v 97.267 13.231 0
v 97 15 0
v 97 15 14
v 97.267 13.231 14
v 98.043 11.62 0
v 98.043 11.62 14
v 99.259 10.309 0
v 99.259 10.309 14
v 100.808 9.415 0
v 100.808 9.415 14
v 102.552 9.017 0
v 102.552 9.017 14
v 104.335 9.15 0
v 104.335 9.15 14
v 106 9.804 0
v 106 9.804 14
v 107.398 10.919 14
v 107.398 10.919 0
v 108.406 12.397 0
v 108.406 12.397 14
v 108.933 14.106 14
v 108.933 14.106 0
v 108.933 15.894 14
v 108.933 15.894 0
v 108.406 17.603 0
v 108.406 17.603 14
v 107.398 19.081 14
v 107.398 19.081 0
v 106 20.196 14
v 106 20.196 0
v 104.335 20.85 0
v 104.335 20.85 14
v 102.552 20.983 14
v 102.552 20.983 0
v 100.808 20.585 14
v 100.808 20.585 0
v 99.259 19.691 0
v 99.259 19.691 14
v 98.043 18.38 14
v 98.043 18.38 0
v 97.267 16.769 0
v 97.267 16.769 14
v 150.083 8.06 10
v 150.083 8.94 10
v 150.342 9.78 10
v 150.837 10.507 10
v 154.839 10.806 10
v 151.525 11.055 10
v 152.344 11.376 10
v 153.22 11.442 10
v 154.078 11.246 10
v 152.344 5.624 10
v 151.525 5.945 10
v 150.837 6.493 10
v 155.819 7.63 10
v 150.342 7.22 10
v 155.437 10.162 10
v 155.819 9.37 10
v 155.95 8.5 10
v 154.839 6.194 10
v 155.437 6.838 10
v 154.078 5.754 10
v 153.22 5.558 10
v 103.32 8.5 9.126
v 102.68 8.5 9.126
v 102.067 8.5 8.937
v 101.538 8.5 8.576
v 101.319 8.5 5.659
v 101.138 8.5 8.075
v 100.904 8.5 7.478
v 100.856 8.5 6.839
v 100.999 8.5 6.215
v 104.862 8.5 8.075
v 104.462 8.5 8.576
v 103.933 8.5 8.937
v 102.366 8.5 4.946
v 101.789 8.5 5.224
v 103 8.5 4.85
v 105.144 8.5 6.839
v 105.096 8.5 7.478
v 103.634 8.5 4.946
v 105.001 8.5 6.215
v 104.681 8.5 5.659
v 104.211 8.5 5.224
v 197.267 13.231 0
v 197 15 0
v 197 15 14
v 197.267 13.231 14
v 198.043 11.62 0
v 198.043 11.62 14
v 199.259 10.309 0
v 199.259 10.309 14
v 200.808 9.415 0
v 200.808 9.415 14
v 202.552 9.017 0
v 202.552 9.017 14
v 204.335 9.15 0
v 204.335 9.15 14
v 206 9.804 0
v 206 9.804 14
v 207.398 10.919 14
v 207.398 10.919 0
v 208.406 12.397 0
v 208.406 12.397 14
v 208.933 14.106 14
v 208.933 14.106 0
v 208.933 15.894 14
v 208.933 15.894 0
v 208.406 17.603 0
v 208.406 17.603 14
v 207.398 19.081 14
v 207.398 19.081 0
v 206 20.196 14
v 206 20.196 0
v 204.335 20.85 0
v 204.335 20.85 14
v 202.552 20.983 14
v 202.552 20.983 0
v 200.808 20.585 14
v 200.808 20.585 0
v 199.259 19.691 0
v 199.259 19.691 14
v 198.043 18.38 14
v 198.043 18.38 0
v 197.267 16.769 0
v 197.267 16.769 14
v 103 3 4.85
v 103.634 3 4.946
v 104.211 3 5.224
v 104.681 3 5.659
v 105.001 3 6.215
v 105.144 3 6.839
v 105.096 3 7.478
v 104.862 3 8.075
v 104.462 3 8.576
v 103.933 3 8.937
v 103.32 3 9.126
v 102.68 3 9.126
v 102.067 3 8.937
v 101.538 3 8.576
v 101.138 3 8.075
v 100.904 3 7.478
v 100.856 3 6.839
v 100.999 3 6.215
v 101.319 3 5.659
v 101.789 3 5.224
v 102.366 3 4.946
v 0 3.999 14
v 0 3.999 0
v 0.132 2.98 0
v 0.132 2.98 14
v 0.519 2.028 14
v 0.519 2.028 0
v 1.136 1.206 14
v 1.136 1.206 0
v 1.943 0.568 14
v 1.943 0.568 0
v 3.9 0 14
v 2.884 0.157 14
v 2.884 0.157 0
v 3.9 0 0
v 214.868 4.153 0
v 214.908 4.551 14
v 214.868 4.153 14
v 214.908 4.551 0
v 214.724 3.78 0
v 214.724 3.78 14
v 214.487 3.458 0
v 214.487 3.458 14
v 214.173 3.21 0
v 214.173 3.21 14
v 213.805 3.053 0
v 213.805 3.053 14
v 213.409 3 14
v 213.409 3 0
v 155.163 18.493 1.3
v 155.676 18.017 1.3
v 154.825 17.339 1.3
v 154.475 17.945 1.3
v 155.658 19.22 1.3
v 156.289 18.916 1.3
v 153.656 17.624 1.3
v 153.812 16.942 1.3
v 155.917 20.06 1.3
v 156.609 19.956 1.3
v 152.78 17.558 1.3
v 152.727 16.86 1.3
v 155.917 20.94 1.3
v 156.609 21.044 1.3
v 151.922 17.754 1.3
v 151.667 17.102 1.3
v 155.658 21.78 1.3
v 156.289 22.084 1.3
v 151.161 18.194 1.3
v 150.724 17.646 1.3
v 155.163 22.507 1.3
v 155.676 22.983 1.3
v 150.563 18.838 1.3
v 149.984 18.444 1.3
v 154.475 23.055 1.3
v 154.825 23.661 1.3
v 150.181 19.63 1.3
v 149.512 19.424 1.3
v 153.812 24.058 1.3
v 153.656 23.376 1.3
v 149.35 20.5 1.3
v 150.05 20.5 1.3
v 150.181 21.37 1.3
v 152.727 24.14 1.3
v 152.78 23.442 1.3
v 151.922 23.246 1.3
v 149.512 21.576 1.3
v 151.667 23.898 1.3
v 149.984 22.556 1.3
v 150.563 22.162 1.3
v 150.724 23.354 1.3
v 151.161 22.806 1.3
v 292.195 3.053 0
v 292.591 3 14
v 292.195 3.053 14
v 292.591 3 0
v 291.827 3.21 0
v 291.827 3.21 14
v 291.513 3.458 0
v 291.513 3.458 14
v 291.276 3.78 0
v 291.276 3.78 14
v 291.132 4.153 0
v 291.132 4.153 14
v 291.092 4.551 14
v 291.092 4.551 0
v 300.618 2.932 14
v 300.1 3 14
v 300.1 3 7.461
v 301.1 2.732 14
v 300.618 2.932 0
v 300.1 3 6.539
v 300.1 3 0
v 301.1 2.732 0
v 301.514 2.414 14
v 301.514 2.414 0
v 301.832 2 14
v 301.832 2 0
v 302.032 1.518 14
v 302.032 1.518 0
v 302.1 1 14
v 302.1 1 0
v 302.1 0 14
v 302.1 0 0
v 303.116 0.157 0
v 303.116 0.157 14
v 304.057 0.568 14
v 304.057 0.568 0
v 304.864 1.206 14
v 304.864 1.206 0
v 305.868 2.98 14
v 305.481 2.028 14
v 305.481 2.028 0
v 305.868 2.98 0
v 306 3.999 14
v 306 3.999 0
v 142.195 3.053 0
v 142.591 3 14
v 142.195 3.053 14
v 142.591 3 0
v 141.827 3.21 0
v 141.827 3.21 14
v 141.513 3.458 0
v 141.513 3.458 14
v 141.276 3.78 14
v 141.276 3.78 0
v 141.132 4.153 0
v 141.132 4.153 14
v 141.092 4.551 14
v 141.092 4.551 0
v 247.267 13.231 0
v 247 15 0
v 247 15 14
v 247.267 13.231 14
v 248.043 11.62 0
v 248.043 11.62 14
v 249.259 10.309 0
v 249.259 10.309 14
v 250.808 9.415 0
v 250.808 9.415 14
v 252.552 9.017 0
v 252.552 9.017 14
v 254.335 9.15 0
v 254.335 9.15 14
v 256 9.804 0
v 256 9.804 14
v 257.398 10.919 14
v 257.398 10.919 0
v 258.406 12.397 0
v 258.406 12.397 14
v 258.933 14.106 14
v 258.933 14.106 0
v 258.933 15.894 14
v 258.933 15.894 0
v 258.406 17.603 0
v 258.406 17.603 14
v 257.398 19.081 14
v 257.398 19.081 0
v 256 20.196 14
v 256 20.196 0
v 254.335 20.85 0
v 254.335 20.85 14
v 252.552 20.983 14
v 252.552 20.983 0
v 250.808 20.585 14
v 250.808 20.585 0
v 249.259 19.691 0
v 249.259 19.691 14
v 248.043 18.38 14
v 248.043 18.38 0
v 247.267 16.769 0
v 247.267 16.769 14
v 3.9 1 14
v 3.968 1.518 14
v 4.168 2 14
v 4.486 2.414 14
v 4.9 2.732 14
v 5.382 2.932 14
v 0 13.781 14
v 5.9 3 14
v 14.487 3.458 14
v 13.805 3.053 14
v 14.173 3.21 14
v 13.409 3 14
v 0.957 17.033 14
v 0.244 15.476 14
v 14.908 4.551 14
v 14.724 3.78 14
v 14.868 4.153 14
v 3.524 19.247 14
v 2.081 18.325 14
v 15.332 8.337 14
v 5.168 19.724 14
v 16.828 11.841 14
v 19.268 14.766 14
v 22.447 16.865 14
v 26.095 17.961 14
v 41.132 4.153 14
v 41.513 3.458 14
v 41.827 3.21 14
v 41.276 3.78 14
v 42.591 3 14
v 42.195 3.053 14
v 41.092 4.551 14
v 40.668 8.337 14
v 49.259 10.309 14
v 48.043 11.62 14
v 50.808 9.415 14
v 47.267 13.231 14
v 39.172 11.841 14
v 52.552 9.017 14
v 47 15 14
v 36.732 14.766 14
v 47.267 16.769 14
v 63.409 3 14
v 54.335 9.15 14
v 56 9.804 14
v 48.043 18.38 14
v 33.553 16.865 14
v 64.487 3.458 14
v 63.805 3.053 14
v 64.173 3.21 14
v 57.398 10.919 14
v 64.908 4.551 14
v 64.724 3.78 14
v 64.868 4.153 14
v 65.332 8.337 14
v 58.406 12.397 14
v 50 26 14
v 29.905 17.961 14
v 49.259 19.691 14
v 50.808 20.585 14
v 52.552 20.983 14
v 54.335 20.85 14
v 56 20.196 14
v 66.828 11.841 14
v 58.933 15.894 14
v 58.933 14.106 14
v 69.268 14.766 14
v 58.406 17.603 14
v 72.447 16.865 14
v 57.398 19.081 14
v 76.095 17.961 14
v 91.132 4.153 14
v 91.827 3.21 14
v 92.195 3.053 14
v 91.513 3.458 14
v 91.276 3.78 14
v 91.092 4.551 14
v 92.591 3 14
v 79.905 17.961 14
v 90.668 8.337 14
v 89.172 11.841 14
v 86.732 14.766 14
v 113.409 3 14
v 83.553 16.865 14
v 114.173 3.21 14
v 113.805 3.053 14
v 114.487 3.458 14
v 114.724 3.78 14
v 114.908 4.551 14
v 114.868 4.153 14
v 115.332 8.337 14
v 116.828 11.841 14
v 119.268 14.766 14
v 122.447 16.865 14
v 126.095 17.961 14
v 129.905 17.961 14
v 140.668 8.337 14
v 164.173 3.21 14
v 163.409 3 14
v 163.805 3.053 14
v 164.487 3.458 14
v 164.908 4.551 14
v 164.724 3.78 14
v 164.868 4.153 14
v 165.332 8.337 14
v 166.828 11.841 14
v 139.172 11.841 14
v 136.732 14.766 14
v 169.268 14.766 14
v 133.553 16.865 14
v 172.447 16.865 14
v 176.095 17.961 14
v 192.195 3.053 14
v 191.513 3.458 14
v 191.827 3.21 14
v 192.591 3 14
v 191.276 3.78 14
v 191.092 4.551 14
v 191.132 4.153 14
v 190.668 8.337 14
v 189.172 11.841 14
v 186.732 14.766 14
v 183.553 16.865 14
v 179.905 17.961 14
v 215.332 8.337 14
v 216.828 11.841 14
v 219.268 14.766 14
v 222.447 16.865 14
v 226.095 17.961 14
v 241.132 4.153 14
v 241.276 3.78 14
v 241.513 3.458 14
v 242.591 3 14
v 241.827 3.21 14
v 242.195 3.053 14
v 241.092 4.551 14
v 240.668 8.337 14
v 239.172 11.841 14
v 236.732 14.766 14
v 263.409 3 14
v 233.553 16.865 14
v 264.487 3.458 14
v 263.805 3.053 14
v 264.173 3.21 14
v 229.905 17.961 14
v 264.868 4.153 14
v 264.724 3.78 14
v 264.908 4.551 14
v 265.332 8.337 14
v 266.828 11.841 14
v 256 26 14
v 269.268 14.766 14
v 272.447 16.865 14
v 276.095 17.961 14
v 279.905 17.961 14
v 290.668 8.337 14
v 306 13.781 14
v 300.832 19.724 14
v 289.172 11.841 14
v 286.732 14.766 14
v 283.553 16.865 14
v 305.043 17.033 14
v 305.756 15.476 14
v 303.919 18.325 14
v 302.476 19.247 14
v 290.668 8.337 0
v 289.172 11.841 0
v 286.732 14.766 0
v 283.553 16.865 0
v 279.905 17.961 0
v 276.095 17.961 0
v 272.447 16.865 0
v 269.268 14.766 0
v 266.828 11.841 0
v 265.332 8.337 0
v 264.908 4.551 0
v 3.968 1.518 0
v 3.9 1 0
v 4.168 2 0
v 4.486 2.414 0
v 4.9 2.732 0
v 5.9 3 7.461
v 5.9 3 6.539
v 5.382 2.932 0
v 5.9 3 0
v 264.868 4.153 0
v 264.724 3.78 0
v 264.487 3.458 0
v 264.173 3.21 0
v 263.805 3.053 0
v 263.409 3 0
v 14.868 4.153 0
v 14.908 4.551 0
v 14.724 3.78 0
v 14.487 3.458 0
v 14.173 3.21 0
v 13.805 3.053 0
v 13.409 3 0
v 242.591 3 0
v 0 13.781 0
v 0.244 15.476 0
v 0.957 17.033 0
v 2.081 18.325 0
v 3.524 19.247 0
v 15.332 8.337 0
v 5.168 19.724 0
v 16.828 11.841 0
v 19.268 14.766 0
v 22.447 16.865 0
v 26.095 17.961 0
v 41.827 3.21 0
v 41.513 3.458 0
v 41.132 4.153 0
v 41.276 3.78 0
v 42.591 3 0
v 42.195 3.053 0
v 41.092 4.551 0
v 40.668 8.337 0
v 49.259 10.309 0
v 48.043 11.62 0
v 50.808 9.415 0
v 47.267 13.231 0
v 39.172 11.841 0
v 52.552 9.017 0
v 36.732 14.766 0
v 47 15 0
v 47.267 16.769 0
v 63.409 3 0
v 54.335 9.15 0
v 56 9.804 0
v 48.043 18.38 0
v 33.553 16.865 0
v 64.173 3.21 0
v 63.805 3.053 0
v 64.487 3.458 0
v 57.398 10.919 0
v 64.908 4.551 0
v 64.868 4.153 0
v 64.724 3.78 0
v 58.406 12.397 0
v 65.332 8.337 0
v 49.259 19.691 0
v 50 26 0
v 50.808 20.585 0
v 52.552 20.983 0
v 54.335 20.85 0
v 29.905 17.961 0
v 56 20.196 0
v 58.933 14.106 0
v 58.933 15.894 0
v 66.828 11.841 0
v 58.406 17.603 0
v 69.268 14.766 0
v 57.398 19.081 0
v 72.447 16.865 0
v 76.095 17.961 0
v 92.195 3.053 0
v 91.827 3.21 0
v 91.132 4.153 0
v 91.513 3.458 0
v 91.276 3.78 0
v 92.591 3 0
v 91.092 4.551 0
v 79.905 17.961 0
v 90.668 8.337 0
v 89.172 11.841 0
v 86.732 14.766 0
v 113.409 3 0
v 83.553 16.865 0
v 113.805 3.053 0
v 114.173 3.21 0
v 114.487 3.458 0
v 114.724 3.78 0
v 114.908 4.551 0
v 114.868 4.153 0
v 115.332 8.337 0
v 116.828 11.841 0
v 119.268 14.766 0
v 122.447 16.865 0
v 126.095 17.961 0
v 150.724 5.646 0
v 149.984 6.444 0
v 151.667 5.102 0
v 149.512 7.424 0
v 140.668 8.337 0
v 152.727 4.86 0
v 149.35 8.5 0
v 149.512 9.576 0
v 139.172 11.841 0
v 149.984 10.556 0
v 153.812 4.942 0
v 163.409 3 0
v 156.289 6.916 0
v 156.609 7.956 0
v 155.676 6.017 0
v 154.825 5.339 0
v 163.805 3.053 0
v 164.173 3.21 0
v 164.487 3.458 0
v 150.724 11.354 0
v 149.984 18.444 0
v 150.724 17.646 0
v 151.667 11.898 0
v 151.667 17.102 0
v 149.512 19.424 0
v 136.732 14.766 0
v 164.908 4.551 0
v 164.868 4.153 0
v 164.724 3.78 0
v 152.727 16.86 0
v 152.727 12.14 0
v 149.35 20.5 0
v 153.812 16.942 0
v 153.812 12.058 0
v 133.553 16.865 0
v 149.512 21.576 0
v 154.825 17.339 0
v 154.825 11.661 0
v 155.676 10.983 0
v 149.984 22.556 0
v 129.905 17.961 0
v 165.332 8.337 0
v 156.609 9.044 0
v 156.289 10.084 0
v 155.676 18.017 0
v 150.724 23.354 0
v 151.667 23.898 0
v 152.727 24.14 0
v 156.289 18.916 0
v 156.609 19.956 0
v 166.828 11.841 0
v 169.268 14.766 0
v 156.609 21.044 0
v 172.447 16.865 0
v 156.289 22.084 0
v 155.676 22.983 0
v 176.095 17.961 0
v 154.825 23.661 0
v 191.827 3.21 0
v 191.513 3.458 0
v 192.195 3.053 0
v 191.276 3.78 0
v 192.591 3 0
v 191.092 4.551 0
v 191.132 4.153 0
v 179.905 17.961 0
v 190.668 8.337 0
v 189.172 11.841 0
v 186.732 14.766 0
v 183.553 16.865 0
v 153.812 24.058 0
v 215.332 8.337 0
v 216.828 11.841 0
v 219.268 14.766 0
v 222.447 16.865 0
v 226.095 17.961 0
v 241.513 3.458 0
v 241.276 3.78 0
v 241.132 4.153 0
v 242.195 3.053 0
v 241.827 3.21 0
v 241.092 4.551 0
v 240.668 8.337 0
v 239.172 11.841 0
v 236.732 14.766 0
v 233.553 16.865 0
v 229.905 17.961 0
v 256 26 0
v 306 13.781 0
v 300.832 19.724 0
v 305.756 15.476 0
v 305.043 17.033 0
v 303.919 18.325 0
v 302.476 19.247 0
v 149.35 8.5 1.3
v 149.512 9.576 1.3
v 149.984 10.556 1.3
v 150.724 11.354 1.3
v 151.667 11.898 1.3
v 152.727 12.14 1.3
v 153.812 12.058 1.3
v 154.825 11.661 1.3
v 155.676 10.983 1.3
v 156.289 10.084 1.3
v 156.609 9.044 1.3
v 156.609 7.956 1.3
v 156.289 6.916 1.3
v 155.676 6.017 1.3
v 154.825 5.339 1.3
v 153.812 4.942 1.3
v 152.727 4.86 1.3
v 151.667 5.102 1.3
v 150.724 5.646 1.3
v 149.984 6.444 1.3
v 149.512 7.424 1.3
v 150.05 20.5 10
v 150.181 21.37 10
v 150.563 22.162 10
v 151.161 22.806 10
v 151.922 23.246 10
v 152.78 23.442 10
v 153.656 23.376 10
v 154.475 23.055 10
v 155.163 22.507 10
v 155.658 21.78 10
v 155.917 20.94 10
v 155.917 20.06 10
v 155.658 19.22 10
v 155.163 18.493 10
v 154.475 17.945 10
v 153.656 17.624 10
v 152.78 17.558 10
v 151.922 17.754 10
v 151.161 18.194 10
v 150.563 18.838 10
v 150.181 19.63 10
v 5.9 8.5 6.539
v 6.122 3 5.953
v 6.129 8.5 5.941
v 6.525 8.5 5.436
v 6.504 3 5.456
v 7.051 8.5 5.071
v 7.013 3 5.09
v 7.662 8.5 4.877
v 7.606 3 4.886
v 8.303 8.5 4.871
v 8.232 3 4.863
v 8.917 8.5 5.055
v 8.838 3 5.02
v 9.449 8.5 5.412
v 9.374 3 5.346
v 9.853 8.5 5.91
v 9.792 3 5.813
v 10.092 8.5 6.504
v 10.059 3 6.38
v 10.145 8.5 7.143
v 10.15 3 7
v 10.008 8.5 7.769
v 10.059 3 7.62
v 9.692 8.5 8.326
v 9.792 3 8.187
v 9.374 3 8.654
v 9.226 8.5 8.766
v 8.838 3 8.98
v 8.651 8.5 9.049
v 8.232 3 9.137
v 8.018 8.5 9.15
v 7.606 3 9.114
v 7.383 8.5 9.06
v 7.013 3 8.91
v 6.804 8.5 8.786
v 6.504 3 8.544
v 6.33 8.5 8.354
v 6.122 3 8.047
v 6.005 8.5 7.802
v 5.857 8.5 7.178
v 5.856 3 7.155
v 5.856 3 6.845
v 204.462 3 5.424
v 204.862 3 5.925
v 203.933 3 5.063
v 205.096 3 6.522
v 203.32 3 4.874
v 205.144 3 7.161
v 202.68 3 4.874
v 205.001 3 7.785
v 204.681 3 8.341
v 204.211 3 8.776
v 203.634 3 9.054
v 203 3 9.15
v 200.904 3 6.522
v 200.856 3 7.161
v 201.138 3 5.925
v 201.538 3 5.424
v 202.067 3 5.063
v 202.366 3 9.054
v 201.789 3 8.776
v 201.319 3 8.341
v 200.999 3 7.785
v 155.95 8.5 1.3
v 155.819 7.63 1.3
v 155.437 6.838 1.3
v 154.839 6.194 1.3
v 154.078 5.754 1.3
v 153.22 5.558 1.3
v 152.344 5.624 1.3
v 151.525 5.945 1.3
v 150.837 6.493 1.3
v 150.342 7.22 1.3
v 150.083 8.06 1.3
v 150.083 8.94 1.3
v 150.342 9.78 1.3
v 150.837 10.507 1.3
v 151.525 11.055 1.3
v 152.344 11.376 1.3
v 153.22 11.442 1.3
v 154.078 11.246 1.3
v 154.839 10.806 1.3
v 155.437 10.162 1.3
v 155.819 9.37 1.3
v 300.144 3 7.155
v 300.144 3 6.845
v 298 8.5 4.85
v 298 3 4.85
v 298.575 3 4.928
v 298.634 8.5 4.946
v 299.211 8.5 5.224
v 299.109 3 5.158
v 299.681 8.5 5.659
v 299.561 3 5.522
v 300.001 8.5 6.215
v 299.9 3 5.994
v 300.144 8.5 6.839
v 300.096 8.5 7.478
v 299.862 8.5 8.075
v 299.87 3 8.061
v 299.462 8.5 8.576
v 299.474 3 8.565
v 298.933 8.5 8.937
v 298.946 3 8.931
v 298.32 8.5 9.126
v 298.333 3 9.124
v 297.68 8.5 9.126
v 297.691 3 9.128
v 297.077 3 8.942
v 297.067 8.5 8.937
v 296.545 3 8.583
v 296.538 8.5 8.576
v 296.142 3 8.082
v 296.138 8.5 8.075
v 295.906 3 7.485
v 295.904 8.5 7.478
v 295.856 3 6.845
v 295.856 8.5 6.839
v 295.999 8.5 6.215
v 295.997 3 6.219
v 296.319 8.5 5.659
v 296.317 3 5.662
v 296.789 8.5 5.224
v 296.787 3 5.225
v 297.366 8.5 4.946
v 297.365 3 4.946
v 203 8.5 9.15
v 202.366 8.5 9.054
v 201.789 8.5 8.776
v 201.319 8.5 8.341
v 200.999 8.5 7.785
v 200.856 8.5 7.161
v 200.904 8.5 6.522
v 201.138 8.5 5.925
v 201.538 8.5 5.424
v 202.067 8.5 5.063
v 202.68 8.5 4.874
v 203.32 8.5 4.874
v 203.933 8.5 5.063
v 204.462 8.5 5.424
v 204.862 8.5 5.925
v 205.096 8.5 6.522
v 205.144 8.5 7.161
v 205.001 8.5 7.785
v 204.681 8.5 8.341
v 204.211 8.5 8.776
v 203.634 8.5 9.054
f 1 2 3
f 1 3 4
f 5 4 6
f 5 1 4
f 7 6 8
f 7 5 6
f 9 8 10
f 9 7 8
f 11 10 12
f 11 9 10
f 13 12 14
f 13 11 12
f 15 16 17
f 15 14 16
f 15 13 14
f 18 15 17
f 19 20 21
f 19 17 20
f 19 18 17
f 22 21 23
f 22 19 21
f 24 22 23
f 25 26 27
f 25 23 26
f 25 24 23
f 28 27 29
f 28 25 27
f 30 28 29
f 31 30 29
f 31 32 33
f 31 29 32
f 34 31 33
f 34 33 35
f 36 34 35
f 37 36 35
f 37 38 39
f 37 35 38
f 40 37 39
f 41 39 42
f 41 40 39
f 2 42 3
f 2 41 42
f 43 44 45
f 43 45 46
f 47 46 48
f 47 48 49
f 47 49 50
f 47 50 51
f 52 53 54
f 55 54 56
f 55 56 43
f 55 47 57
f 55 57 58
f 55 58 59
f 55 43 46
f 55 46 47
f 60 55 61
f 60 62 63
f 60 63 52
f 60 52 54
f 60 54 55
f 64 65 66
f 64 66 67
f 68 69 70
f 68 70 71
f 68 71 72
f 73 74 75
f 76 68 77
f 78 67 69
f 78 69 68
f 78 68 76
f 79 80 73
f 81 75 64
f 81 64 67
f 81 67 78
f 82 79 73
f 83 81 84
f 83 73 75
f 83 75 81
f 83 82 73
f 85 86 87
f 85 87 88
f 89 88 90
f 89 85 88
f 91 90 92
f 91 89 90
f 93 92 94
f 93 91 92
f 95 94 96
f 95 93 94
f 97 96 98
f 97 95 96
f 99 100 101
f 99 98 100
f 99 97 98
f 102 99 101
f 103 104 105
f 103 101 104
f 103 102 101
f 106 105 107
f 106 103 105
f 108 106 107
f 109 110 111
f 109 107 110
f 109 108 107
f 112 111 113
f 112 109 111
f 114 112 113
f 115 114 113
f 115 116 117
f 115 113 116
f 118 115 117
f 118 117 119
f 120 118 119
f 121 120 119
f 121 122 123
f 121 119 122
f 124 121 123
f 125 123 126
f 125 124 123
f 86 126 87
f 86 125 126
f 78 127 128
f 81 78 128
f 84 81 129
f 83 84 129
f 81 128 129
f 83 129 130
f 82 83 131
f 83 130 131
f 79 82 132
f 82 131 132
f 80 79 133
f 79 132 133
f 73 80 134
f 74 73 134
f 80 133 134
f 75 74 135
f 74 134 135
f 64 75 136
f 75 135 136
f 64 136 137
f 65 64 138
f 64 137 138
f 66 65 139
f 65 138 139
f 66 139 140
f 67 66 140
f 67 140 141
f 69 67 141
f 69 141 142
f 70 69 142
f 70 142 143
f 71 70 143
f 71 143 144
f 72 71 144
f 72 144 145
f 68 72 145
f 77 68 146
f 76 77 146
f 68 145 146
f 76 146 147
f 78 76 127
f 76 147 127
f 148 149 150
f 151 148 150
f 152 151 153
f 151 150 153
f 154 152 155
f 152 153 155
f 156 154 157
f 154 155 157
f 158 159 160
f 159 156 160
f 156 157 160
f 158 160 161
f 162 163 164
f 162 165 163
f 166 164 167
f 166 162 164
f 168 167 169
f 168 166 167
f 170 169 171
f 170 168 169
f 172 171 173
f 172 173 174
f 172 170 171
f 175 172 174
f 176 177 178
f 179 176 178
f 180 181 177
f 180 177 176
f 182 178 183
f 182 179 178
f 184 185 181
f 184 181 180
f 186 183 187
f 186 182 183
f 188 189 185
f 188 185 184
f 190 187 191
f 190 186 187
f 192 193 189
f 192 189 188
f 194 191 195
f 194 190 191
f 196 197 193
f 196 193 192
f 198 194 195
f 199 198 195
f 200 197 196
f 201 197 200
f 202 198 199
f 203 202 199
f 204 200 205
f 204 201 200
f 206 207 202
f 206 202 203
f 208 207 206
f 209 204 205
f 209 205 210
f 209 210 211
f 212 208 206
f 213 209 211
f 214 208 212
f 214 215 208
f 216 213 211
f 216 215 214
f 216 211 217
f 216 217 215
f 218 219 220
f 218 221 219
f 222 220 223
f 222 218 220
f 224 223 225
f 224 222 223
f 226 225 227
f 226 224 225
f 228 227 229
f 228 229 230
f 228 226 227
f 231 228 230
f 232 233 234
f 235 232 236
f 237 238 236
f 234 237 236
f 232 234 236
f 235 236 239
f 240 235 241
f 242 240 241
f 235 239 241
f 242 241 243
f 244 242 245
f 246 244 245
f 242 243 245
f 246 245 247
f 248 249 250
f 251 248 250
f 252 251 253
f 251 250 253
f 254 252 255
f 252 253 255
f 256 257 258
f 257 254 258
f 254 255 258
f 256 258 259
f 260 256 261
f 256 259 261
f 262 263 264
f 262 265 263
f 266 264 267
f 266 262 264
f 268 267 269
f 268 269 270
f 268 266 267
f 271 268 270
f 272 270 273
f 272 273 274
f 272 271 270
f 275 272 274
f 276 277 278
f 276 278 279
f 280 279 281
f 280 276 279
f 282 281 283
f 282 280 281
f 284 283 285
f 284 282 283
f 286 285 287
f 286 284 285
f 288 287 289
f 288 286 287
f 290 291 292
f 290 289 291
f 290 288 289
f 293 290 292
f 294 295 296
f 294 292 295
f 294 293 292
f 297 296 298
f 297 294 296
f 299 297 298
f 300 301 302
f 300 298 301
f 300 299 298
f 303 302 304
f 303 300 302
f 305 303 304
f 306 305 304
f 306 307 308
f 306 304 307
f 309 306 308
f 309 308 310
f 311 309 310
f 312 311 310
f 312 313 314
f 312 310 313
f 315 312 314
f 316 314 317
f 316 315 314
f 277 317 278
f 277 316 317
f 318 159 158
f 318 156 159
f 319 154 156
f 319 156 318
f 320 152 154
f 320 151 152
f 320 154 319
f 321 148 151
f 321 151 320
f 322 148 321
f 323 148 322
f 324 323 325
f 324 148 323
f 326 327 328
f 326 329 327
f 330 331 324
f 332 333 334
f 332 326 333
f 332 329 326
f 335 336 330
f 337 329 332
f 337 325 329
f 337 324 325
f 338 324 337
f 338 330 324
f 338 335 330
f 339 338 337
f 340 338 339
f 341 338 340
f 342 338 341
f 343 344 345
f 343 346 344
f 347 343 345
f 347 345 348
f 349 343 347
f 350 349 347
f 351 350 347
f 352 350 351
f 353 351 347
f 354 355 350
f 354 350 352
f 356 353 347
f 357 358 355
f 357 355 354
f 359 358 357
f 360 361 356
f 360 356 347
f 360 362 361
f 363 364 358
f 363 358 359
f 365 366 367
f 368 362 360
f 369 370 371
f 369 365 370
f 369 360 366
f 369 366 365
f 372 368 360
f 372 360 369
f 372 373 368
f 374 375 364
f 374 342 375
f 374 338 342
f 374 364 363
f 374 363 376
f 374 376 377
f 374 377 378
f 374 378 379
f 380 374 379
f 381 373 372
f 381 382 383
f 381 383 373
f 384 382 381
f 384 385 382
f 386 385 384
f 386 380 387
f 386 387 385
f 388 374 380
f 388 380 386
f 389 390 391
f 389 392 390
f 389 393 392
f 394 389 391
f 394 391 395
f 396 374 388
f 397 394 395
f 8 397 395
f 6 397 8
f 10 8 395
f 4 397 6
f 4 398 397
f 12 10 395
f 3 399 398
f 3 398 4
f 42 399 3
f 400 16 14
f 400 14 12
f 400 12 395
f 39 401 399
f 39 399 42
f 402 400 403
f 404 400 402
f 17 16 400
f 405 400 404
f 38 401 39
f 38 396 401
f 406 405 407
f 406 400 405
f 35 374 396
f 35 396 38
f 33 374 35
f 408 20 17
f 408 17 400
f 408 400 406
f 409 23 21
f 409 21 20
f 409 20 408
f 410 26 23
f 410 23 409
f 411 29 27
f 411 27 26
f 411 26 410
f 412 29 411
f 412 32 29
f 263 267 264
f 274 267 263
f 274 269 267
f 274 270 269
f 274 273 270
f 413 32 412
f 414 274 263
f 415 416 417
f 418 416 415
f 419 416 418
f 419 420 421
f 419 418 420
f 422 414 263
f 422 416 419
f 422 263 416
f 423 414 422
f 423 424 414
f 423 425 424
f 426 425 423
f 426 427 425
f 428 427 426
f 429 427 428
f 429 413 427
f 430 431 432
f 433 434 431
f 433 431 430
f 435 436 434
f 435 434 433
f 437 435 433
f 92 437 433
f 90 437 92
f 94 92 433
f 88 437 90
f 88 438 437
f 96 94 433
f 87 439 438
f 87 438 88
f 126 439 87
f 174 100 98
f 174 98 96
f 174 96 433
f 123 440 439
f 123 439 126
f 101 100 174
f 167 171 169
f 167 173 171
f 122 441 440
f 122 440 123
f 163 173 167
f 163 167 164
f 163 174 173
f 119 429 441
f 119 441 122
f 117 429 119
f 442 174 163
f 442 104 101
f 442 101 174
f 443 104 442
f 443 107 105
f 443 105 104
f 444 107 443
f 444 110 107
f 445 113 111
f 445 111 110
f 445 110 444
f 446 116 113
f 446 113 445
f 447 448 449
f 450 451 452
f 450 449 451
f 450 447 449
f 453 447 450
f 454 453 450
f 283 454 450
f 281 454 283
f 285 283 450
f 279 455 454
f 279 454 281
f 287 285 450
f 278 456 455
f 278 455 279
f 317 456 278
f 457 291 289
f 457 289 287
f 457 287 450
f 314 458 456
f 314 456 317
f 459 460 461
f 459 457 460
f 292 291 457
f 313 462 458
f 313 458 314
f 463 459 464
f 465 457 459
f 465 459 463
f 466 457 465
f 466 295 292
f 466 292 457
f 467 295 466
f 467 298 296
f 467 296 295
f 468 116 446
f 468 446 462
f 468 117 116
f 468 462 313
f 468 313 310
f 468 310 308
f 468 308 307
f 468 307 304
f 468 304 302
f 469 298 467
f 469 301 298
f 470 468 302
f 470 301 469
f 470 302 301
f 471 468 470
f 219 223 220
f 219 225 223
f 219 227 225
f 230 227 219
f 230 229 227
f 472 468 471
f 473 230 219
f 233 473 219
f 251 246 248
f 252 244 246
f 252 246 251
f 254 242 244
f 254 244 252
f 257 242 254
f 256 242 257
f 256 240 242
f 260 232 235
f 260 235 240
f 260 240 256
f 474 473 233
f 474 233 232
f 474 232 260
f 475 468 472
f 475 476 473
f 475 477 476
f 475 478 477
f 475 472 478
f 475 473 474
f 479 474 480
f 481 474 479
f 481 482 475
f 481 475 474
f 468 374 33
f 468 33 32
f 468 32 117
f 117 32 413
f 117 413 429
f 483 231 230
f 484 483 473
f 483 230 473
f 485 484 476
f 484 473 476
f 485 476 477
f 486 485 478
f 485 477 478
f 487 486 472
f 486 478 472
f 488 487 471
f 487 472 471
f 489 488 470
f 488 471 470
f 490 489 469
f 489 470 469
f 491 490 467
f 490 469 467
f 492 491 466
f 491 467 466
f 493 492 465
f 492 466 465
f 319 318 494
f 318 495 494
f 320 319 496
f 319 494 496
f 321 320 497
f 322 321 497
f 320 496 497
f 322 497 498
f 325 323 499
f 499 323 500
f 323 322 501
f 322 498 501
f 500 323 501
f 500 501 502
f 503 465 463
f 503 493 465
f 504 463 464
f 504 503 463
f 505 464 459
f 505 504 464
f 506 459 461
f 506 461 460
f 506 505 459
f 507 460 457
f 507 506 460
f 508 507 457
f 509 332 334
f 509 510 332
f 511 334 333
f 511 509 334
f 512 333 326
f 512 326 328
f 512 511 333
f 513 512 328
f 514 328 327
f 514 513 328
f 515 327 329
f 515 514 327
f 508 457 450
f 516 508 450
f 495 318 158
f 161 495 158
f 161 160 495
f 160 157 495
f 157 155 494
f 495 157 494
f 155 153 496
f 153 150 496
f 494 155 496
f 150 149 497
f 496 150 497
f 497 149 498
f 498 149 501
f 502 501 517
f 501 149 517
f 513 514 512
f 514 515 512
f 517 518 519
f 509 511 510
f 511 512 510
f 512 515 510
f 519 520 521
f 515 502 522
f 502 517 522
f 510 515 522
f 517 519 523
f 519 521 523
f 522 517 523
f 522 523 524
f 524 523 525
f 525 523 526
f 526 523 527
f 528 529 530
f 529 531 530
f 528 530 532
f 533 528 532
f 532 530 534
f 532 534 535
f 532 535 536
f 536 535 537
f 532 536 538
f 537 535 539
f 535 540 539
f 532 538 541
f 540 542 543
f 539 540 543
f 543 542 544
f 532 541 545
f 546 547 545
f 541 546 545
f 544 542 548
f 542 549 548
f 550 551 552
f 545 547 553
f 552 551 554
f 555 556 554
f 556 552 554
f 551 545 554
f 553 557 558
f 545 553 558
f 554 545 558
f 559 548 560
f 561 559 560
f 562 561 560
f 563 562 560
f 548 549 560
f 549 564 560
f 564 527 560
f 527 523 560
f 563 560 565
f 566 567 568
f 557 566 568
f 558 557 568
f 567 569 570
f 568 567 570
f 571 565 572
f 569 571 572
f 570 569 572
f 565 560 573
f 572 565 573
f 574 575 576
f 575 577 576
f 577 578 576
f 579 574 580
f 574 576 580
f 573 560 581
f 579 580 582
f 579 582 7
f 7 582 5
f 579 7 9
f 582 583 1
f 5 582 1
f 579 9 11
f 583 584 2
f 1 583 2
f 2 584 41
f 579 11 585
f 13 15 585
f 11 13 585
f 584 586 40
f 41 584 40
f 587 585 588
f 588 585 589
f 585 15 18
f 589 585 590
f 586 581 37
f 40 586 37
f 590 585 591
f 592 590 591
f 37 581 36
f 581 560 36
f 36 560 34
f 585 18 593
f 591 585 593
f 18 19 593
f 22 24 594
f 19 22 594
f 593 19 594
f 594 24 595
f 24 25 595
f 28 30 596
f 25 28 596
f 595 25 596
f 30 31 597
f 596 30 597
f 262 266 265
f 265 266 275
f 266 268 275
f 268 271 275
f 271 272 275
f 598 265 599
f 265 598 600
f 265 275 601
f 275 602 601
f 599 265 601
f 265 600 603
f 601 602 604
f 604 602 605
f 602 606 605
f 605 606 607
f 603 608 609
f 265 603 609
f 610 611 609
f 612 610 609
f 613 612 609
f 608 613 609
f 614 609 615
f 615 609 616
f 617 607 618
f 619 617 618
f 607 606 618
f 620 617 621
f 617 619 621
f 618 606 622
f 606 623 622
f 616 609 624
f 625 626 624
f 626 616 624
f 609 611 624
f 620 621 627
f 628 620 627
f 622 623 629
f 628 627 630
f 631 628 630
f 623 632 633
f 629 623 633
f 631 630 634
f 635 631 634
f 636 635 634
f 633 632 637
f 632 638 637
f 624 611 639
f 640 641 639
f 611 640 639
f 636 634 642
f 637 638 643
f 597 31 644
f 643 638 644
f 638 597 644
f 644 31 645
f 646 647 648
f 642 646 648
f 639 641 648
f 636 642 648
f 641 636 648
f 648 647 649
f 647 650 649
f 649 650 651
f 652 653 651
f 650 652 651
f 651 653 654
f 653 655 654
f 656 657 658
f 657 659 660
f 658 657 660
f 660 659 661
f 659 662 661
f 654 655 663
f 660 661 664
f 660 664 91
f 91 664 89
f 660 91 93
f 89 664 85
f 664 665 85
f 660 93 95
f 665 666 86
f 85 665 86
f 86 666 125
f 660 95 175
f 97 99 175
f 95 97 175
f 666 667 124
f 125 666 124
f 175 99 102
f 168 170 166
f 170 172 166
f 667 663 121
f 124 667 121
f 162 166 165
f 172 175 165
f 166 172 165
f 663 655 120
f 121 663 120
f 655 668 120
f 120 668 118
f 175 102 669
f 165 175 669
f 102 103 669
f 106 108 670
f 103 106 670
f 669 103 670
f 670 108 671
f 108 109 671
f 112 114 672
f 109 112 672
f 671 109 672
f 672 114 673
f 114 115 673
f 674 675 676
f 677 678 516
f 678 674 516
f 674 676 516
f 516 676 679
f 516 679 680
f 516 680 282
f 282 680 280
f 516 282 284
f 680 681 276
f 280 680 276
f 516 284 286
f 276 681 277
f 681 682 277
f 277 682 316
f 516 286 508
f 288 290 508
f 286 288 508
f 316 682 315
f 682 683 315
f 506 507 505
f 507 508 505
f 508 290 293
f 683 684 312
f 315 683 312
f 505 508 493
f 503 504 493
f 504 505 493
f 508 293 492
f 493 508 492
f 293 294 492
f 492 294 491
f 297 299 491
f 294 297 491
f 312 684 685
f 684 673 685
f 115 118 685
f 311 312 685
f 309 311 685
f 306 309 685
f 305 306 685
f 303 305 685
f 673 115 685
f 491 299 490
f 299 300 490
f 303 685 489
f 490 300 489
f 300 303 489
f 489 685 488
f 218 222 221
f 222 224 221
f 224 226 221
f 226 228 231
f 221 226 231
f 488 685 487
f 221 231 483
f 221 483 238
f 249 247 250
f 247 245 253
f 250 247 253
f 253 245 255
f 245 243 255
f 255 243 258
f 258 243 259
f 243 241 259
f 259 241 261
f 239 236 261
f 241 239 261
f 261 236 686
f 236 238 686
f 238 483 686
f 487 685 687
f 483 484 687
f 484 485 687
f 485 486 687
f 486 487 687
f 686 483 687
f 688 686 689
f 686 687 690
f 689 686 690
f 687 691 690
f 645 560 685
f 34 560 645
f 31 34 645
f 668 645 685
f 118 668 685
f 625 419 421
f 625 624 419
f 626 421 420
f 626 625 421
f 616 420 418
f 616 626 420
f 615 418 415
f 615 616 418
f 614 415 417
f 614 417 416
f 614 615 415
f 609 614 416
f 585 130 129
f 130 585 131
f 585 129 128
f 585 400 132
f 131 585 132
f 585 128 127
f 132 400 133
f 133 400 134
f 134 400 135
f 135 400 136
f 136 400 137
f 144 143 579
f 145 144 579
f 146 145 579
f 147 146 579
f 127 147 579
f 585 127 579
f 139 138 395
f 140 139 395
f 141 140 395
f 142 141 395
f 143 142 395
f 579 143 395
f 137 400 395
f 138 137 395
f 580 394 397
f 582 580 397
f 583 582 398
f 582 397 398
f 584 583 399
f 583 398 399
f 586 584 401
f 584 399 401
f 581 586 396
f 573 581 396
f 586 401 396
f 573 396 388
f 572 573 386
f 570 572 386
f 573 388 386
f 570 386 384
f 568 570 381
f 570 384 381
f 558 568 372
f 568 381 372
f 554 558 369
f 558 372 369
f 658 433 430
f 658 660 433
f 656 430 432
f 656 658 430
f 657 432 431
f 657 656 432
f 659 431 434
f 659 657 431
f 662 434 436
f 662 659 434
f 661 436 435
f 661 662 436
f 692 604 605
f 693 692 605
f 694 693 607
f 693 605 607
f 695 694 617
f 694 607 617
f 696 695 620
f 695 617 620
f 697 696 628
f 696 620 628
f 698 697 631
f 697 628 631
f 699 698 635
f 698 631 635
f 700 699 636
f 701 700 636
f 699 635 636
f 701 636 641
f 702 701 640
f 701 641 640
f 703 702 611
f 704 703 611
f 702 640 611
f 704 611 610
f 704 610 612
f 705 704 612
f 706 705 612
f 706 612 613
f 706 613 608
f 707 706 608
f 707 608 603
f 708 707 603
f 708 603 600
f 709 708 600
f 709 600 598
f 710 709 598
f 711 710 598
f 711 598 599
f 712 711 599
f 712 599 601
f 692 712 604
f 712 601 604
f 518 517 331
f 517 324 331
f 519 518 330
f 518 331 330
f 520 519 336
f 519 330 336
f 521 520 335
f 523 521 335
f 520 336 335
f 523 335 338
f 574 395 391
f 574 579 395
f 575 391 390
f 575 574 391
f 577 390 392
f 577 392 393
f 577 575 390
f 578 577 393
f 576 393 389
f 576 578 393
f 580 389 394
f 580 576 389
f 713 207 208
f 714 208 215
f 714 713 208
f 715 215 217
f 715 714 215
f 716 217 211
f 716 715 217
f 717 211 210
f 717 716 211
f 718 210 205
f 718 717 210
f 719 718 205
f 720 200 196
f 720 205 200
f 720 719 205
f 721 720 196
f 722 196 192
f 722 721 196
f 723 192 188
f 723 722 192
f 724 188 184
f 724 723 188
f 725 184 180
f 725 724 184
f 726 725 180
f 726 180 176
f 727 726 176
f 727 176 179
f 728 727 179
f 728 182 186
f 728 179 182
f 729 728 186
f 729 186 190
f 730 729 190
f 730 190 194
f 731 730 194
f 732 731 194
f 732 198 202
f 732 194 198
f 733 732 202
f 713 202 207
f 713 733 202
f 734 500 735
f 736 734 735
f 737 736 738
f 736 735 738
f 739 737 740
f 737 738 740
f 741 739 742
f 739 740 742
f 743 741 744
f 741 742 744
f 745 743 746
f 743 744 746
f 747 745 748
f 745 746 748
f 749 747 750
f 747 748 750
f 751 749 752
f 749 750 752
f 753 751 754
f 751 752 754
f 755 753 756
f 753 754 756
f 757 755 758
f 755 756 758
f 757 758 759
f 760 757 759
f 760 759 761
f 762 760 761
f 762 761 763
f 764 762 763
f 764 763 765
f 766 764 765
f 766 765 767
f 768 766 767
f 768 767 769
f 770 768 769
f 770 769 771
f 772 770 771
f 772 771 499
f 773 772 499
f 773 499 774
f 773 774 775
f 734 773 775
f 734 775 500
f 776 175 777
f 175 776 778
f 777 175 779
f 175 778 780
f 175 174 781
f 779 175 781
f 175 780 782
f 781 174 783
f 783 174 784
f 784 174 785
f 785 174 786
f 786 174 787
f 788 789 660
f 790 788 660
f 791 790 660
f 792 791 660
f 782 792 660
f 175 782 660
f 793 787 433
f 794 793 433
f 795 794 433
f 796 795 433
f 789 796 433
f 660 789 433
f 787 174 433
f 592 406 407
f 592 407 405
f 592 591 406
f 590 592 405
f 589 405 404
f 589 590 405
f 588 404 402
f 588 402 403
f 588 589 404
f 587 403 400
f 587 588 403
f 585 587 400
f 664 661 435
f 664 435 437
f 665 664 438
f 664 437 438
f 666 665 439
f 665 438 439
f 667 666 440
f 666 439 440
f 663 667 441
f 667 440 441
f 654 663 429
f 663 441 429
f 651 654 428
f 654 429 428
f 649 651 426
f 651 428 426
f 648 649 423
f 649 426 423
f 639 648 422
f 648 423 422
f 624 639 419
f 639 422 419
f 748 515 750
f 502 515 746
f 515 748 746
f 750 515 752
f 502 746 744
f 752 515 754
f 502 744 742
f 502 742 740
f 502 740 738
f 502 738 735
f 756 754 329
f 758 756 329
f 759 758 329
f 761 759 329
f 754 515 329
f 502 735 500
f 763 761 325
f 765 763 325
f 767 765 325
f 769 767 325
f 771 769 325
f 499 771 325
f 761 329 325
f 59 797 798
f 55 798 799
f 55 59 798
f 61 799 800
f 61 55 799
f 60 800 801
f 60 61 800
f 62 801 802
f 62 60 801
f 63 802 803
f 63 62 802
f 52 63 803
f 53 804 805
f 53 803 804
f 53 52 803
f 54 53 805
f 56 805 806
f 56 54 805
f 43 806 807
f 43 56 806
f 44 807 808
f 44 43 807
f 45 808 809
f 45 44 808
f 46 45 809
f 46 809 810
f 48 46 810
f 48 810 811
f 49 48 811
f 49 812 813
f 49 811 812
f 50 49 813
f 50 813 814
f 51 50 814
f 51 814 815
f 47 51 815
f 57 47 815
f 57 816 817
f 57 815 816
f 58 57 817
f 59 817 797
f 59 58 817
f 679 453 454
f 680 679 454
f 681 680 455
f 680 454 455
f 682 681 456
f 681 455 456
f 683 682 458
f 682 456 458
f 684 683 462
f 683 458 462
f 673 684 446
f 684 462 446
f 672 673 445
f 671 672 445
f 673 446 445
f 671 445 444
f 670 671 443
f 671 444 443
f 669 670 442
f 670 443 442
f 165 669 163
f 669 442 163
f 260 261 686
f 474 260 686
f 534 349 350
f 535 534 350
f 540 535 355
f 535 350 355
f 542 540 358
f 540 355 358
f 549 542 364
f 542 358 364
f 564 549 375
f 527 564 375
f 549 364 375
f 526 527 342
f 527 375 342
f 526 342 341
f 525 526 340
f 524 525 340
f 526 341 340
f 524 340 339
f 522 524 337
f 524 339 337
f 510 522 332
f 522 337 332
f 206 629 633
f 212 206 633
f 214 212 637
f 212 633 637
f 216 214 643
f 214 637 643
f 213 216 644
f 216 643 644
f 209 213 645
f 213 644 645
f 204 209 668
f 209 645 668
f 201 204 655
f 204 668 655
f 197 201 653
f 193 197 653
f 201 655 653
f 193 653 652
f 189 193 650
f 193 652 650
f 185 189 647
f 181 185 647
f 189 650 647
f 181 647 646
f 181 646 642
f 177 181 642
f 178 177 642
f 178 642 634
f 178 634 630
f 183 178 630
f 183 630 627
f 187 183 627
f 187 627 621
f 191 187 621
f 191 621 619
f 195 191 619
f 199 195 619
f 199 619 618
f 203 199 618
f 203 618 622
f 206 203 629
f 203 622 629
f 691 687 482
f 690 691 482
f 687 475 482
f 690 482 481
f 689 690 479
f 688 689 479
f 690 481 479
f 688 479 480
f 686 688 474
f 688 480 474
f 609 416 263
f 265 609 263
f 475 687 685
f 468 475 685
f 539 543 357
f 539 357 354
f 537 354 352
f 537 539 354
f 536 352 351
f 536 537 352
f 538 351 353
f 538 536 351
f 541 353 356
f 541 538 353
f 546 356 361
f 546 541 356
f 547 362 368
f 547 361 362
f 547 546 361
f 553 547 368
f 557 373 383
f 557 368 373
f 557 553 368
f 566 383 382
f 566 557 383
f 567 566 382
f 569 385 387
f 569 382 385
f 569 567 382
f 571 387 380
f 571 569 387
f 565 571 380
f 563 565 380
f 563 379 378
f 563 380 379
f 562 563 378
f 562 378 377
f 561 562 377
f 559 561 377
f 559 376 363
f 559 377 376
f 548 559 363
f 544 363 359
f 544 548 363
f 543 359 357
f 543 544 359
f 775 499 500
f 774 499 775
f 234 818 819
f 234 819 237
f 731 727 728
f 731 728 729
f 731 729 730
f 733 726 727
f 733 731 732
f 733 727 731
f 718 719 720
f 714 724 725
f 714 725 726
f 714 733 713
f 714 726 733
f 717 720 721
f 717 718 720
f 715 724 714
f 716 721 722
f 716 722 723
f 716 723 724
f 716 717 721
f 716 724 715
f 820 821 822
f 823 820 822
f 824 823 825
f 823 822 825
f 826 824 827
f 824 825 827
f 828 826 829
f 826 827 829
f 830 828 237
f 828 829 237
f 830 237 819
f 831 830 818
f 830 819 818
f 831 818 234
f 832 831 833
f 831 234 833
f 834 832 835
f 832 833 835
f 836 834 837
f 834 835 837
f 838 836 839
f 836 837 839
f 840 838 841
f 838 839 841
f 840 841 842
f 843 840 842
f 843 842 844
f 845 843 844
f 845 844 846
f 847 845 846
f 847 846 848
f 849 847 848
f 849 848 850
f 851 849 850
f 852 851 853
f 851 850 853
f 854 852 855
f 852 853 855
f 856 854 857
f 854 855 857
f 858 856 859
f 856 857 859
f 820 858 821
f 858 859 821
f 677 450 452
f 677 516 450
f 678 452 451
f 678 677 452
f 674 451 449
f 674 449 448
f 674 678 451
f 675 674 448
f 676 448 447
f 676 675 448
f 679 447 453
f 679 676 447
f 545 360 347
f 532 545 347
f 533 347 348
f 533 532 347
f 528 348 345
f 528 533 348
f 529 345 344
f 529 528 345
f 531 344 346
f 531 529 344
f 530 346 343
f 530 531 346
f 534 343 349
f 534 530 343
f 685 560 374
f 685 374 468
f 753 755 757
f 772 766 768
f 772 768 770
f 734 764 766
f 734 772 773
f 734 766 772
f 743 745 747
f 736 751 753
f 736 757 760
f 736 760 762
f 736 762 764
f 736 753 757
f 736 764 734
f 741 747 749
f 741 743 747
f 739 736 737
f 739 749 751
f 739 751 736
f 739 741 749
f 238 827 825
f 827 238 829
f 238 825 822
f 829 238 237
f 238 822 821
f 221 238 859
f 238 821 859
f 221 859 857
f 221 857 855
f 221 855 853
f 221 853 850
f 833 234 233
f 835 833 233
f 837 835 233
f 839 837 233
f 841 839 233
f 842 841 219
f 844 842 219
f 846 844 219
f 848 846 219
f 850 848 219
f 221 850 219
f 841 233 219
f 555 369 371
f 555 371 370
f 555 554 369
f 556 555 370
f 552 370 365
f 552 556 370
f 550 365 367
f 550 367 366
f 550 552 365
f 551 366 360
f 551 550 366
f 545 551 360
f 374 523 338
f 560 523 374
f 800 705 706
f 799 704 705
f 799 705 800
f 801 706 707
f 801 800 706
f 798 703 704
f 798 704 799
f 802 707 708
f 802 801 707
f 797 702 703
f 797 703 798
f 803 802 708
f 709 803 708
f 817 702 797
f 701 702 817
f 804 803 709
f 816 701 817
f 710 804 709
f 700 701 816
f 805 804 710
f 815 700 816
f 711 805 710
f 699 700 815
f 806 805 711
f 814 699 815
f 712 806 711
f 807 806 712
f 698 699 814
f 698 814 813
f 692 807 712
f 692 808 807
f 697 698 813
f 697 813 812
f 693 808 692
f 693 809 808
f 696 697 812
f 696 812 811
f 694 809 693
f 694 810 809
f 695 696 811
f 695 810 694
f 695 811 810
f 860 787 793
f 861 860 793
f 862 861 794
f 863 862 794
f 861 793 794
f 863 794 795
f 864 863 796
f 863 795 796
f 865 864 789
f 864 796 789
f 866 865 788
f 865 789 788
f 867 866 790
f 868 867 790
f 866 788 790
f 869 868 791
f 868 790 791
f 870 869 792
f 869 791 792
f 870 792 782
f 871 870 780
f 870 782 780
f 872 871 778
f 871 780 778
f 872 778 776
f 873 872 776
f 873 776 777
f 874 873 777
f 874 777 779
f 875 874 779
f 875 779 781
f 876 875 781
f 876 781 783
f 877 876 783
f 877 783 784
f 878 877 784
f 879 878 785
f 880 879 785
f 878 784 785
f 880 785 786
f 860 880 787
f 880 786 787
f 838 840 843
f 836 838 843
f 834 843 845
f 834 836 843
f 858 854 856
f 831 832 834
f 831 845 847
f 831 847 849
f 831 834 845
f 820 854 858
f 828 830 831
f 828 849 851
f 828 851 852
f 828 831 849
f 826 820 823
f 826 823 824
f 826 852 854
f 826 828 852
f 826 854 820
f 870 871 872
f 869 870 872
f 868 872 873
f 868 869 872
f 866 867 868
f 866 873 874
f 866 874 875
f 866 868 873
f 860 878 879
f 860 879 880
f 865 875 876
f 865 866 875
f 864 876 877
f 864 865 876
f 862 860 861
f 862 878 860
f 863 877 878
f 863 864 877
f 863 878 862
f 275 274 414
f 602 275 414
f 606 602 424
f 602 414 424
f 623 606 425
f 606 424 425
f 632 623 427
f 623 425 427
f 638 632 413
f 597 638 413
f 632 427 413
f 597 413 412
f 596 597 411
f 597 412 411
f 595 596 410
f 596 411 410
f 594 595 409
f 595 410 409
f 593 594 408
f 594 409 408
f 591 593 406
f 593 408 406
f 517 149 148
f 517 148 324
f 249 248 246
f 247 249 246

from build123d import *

# Parameters (mm, degrees)
ESQUISSE1_W                  = 306
ESQUISSE1_H                  = 26
BOSS_EXTRU_1_DEPTH           = 14
ENL_V_MAT_EXTRU_1_DEPTH      = 14.1
CONG_1_R                     = 1.5
CONG_2_R                     = 2
ENL_V_MAT_EXTRU_2_DEPTH      = 308.421534704
ENL_V_MAT_EXTRU_2_DEPTH_BACK = 308.421534704
CONG_3_R                     = 6
CONG_4_R                     = 4
ENL_V_MAT_EXTRU_3_DEPTH      = 308.421534704
ENL_V_MAT_EXTRU_3_DEPTH_BACK = 10
ESQUISSE4_R                  = 2.95
ESQUISSE6_R                  = 2.15
ENL_V_MAT_EXTRU_5_DEPTH      = 5.5
ENL_V_MAT_EXTRU_6_DEPTH      = 308.421534704
ENL_V_MAT_EXTRU_6_DEPTH_BACK = 308.421534704
ESQUISSE7_R                  = 6
ESQUISSE8_R                  = 3.65
ENL_V_MAT_EXTRU_7_DEPTH      = 1.3


with BuildPart() as part:
    # Esquisse1 → Boss.-Extru.1 (new body)
    with BuildSketch(Plane.XY):
        with Locations((153, 13)):
            Rectangle(ESQUISSE1_W, ESQUISSE1_H)
    extrude(amount=BOSS_EXTRU_1_DEPTH)

    # Esquisse2 → Enlèv. mat.-Extru.1 (cut)
    with BuildSketch(Plane.XY.offset(14)):
        with BuildLine():
            Line((215.053571921, 3), (190.946428079, 3))
            ThreePointArc((190.946428079, 3), (178, 18.1), (165.053571921, 3))
            Line((165.053571921, 3), (140.946428079, 3))
            ThreePointArc((140.946428079, 3), (128, 18.1), (115.053571921, 3))
            Line((115.053571921, 3), (90.946428079, 3))
            ThreePointArc((90.946428079, 3), (78, 18.1), (65.053571921, 3))
            Line((65.053571921, 3), (40.946428079, 3))
            ThreePointArc((40.946428079, 3), (28, 18.1), (15.053571921, 3))
            Line((15.053571921, 3), (3.9, 3))
            Line((3.9, 3), (3.9, 0))
            Line((3.9, 0), (302.1, 0))
            Line((302.1, 0), (302.1, 3))
            Line((302.1, 3), (290.946428079, 3))
            ThreePointArc((290.946428079, 3), (278, 18.1), (265.053571921, 3))
            Line((265.053571921, 3), (240.946428079, 3))
            ThreePointArc((240.946428079, 3), (228, 18.1), (215.053571921, 3))
        make_face()
    extrude(amount=-ENL_V_MAT_EXTRU_1_DEPTH, mode=Mode.SUBTRACT)

    # Congé1
    cong_1_edges = [part.edges().sort_by_distance(p)[0] for p in [
        (165.053571921, 3, 7),
        (190.946428079, 3, 7),
        (215.053571921, 3, 7),
        (240.946428079, 3, 7),
        (265.053571921, 3, 7),
        (290.946428079, 3, 7),
        (15.053571921, 3, 7),
        (40.946428079, 3, 7),
        (65.053571921, 3, 7),
        (90.946428079, 3, 7),
        (115.053571921, 3, 7),
        (140.946428079, 3, 7),
    ]]
    fillet(cong_1_edges, radius=CONG_1_R)

    # Congé2
    cong_2_edges = [part.edges().sort_by_distance(p)[0] for p in [
        (302.1, 3, 7),
        (3.9, 3, 7),
    ]]
    fillet(cong_2_edges, radius=CONG_2_R)

    # Esquisse3 → Enlèv. mat.-Extru.2 (cut, two sides: drawn at the far end of the back side and taken through both)
    with BuildSketch(Plane.XY.offset(14).offset(-ENL_V_MAT_EXTRU_2_DEPTH_BACK)):
        Polygon((0, 19), (50, 26), (0, 26), align=None)
        Polygon((306, 26), (306, 19), (256, 26), align=None)
    extrude(amount=ENL_V_MAT_EXTRU_2_DEPTH + ENL_V_MAT_EXTRU_2_DEPTH_BACK, mode=Mode.SUBTRACT)

    # Congé3
    cong_3_edges = [part.edges().sort_by_distance(p)[0] for p in [
        (0, 19, 7),
        (306, 19, 7),
    ]]
    fillet(cong_3_edges, radius=CONG_3_R)

    # Congé4
    # the kernel refuses this fillet: 4 mm, written as the material it takes off along each edge
    with BuildSketch(Plane(origin=(306, 0, -9.996874512), x_dir=(0, 1, 0), z_dir=(0, 0, 1))) as cong_4_piece_1:
        with BuildLine():
            CenterArc((3.998749805, 4), CONG_4_R, 181.432543738, 88.567456262)
            Line((0, 3.9), (-0.079974996, 3.898))
            ThreePointArc((-0.079974996, 3.898), (-0.08, 1.95), (-0.08, 0))
            Line((-0.08, 0), (0, -0.08))
            Line((0, -0.08), (3.998749805, -0.08))
            Line((3.998749805, -0.08), (3.998749805, 0))
        make_face()
    extrude(amount=33.993749023, mode=Mode.SUBTRACT)
    with BuildSketch(Plane(origin=(0, 0, -9.996874512), x_dir=(0, 1, 0), z_dir=(0, 0, 1))) as cong_4_piece_2:
        with BuildLine():
            CenterArc((3.998749805, -4), CONG_4_R, 90, 88.567456262)
            Line((0, -3.9), (-0.079974996, -3.898))
            ThreePointArc((-0.079974996, -3.898), (-0.08, -1.95), (-0.08, 0))
            Line((-0.08, 0), (0, 0.08))
            Line((0, 0.08), (3.998749805, 0.08))
            Line((3.998749805, 0.08), (3.998749805, 0))
        make_face()
    extrude(amount=33.993749023, mode=Mode.SUBTRACT)

    # Esquisse4 → Enlèv. mat.-Extru.3 (cut, two sides: drawn at the far end of the back side and taken through both)
    with BuildSketch(Plane(origin=(0, 0, 0), x_dir=(-1, 0, 0), z_dir=(0, 0, -1)).offset(-ENL_V_MAT_EXTRU_3_DEPTH_BACK)):
        with Locations((-153, 20.5)):
            Circle(ESQUISSE4_R)
        with Locations(Location((-153, 8.5, 0), (0, 0, 180))):
            Circle(ESQUISSE4_R)
    extrude(amount=ENL_V_MAT_EXTRU_3_DEPTH + ENL_V_MAT_EXTRU_3_DEPTH_BACK, mode=Mode.SUBTRACT)

    # Esquisse6 → Enlèv. mat.-Extru.5 (cut)
    with BuildSketch(Plane.XZ.offset(-3)):
        with Locations(Location((298, 7, 0), (0, 0, 270))):
            Circle(ESQUISSE6_R)
        with Locations(Location((8, 7, 0), (0, 0, 192.380798917))):
            Circle(ESQUISSE6_R)
        with Locations(Location((103, 7, 0), (0, 0, 270))):
            Circle(ESQUISSE6_R)
        with Locations(Location((203, 7, 0), (0, 0, 90))):
            Circle(ESQUISSE6_R)
    extrude(amount=-ENL_V_MAT_EXTRU_5_DEPTH, mode=Mode.SUBTRACT)

    # Esquisse7 → Enlèv. mat.-Extru.6 (cut, two sides: drawn at the far end of the back side and taken through both)
    with BuildSketch(Plane.XY.offset(14).offset(-ENL_V_MAT_EXTRU_6_DEPTH_BACK)):
        with Locations(Location((53, 15, 0), (0, 0, 180))):
            Circle(ESQUISSE7_R)
        with Locations(Location((103, 15, 0), (0, 0, 180))):
            Circle(ESQUISSE7_R)
        with Locations(Location((203, 15, 0), (0, 0, 180))):
            Circle(ESQUISSE7_R)
        with Locations(Location((253, 15, 0), (0, 0, 180))):
            Circle(ESQUISSE7_R)
    extrude(amount=ENL_V_MAT_EXTRU_6_DEPTH + ENL_V_MAT_EXTRU_6_DEPTH_BACK, mode=Mode.SUBTRACT)

    # Esquisse8 → Enlèv. mat.-Extru.7 (cut)
    with BuildSketch(Plane(origin=(0, 0, 0), x_dir=(-1, 0, 0), z_dir=(0, 0, -1))):
        with Locations((-153, 20.5)):
            Circle(ESQUISSE8_R)
        with Locations((-153, 8.5)):
            Circle(ESQUISSE8_R)
    extrude(amount=-ENL_V_MAT_EXTRU_7_DEPTH, mode=Mode.SUBTRACT)


solid = part.part
